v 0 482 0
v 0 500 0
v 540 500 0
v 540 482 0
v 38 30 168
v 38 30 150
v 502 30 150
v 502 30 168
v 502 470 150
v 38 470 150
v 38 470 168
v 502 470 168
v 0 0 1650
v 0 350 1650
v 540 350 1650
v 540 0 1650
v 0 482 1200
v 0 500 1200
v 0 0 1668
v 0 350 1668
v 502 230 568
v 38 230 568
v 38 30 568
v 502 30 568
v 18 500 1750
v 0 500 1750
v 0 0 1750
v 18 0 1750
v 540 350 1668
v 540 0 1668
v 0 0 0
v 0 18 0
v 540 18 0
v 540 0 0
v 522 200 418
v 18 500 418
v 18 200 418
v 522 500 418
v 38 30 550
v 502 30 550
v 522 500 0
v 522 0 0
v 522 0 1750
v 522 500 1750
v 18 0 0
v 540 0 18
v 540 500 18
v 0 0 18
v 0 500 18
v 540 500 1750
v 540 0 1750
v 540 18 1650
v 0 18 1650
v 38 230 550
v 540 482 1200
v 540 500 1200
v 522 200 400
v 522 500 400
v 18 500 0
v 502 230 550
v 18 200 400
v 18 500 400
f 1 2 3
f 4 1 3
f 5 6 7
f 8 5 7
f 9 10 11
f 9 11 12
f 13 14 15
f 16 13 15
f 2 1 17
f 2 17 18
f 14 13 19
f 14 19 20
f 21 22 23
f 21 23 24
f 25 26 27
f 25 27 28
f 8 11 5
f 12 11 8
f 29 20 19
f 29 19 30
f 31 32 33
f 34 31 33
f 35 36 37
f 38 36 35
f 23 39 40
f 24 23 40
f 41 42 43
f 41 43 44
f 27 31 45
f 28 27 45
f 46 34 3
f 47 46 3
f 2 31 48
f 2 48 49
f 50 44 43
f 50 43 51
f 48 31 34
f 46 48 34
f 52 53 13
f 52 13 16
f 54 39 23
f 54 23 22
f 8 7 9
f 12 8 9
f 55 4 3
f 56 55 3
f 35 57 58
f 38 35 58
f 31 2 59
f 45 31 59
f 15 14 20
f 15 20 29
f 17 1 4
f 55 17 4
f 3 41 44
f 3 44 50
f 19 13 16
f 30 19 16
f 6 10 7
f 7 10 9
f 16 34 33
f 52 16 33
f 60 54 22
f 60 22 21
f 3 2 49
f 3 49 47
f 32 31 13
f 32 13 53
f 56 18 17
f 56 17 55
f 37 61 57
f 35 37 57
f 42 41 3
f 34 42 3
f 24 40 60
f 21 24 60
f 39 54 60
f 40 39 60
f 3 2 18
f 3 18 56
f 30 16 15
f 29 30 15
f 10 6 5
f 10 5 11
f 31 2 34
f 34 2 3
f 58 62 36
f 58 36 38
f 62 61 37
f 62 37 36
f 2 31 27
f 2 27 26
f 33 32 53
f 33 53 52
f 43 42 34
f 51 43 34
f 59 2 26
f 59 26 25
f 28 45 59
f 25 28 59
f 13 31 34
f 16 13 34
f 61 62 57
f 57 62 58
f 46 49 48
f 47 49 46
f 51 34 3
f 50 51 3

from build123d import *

# Parameters (mm, degrees)
BOX_W        = 18
BOX_H        = 500
BOX_DEPTH    = 1750
BOX001_W     = 18
BOX001_H     = 500
BOX001_DEPTH = 1750
BOX002_W     = 540
BOX002_H     = 500
BOX002_DEPTH = 18
BOX003_W     = 540
BOX003_H     = 18
BOX003_DEPTH = 1650
BOX004_W     = 540
BOX004_H     = 18
BOX004_DEPTH = 1200
BOX005_W     = 504
BOX005_H     = 300
BOX005_DEPTH = 18
BOX006_W     = 464
BOX006_H     = 440
BOX006_DEPTH = 18
BOX007_W     = 464
BOX007_H     = 200
BOX007_DEPTH = 18
BOX008_W     = 540
BOX008_H     = 350
BOX008_DEPTH = 18


with BuildPart() as box:
    # Box → Box (new body)
    with BuildSketch(Plane.XY):
        with Locations((9, 250)):
            Rectangle(BOX_W, BOX_H)
    extrude(amount=BOX_DEPTH)


with BuildPart() as box001:
    # Box001 → Box001 (new body)
    with BuildSketch(Plane(origin=(522, 0, 0), x_dir=(1, 0, 0), z_dir=(0, 0, 1))):
        with Locations((9, 250)):
            Rectangle(BOX001_W, BOX001_H)
    extrude(amount=BOX001_DEPTH)


with BuildPart() as box002:
    # Box002 → Box002 (new body)
    with BuildSketch(Plane.XY):
        with Locations((270, 250)):
            Rectangle(BOX002_W, BOX002_H)
    extrude(amount=BOX002_DEPTH)


with BuildPart() as box003:
    # Box003 → Box003 (new body)
    with BuildSketch(Plane.XY):
        with Locations((270, 9)):
            Rectangle(BOX003_W, BOX003_H)
    extrude(amount=BOX003_DEPTH)


with BuildPart() as box004:
    # Box004 → Box004 (new body)
    with BuildSketch(Plane(origin=(0, 482, 0), x_dir=(1, 0, 0), z_dir=(0, 0, 1))):
        with Locations((270, 9)):
            Rectangle(BOX004_W, BOX004_H)
    extrude(amount=BOX004_DEPTH)


with BuildPart() as box005:
    # Box005 → Box005 (new body)
    with BuildSketch(Plane(origin=(18, 200, 400), x_dir=(1, 0, 0), z_dir=(0, 0, 1))):
        with Locations((252, 150)):
            Rectangle(BOX005_W, BOX005_H)
    extrude(amount=BOX005_DEPTH)


with BuildPart() as box006:
    # Box006 → Box006 (new body)
    with BuildSketch(Plane(origin=(38, 30, 150), x_dir=(1, 0, 0), z_dir=(0, 0, 1))):
        with Locations((232, 220)):
            Rectangle(BOX006_W, BOX006_H)
    extrude(amount=BOX006_DEPTH)


with BuildPart() as box007:
    # Box007 → Box007 (new body)
    with BuildSketch(Plane(origin=(38, 30, 550), x_dir=(1, 0, 0), z_dir=(0, 0, 1))):
        with Locations((232, 100)):
            Rectangle(BOX007_W, BOX007_H)
    extrude(amount=BOX007_DEPTH)


with BuildPart() as box008:
    # Box008 → Box008 (new body)
    with BuildSketch(Plane.XY.offset(1650)):
        with Locations((270, 175)):
            Rectangle(BOX008_W, BOX008_H)
    extrude(amount=BOX008_DEPTH)


solid = Compound([box.part, box001.part, box002.part, box003.part, box004.part, box005.part, box006.part, box007.part, box008.part])
